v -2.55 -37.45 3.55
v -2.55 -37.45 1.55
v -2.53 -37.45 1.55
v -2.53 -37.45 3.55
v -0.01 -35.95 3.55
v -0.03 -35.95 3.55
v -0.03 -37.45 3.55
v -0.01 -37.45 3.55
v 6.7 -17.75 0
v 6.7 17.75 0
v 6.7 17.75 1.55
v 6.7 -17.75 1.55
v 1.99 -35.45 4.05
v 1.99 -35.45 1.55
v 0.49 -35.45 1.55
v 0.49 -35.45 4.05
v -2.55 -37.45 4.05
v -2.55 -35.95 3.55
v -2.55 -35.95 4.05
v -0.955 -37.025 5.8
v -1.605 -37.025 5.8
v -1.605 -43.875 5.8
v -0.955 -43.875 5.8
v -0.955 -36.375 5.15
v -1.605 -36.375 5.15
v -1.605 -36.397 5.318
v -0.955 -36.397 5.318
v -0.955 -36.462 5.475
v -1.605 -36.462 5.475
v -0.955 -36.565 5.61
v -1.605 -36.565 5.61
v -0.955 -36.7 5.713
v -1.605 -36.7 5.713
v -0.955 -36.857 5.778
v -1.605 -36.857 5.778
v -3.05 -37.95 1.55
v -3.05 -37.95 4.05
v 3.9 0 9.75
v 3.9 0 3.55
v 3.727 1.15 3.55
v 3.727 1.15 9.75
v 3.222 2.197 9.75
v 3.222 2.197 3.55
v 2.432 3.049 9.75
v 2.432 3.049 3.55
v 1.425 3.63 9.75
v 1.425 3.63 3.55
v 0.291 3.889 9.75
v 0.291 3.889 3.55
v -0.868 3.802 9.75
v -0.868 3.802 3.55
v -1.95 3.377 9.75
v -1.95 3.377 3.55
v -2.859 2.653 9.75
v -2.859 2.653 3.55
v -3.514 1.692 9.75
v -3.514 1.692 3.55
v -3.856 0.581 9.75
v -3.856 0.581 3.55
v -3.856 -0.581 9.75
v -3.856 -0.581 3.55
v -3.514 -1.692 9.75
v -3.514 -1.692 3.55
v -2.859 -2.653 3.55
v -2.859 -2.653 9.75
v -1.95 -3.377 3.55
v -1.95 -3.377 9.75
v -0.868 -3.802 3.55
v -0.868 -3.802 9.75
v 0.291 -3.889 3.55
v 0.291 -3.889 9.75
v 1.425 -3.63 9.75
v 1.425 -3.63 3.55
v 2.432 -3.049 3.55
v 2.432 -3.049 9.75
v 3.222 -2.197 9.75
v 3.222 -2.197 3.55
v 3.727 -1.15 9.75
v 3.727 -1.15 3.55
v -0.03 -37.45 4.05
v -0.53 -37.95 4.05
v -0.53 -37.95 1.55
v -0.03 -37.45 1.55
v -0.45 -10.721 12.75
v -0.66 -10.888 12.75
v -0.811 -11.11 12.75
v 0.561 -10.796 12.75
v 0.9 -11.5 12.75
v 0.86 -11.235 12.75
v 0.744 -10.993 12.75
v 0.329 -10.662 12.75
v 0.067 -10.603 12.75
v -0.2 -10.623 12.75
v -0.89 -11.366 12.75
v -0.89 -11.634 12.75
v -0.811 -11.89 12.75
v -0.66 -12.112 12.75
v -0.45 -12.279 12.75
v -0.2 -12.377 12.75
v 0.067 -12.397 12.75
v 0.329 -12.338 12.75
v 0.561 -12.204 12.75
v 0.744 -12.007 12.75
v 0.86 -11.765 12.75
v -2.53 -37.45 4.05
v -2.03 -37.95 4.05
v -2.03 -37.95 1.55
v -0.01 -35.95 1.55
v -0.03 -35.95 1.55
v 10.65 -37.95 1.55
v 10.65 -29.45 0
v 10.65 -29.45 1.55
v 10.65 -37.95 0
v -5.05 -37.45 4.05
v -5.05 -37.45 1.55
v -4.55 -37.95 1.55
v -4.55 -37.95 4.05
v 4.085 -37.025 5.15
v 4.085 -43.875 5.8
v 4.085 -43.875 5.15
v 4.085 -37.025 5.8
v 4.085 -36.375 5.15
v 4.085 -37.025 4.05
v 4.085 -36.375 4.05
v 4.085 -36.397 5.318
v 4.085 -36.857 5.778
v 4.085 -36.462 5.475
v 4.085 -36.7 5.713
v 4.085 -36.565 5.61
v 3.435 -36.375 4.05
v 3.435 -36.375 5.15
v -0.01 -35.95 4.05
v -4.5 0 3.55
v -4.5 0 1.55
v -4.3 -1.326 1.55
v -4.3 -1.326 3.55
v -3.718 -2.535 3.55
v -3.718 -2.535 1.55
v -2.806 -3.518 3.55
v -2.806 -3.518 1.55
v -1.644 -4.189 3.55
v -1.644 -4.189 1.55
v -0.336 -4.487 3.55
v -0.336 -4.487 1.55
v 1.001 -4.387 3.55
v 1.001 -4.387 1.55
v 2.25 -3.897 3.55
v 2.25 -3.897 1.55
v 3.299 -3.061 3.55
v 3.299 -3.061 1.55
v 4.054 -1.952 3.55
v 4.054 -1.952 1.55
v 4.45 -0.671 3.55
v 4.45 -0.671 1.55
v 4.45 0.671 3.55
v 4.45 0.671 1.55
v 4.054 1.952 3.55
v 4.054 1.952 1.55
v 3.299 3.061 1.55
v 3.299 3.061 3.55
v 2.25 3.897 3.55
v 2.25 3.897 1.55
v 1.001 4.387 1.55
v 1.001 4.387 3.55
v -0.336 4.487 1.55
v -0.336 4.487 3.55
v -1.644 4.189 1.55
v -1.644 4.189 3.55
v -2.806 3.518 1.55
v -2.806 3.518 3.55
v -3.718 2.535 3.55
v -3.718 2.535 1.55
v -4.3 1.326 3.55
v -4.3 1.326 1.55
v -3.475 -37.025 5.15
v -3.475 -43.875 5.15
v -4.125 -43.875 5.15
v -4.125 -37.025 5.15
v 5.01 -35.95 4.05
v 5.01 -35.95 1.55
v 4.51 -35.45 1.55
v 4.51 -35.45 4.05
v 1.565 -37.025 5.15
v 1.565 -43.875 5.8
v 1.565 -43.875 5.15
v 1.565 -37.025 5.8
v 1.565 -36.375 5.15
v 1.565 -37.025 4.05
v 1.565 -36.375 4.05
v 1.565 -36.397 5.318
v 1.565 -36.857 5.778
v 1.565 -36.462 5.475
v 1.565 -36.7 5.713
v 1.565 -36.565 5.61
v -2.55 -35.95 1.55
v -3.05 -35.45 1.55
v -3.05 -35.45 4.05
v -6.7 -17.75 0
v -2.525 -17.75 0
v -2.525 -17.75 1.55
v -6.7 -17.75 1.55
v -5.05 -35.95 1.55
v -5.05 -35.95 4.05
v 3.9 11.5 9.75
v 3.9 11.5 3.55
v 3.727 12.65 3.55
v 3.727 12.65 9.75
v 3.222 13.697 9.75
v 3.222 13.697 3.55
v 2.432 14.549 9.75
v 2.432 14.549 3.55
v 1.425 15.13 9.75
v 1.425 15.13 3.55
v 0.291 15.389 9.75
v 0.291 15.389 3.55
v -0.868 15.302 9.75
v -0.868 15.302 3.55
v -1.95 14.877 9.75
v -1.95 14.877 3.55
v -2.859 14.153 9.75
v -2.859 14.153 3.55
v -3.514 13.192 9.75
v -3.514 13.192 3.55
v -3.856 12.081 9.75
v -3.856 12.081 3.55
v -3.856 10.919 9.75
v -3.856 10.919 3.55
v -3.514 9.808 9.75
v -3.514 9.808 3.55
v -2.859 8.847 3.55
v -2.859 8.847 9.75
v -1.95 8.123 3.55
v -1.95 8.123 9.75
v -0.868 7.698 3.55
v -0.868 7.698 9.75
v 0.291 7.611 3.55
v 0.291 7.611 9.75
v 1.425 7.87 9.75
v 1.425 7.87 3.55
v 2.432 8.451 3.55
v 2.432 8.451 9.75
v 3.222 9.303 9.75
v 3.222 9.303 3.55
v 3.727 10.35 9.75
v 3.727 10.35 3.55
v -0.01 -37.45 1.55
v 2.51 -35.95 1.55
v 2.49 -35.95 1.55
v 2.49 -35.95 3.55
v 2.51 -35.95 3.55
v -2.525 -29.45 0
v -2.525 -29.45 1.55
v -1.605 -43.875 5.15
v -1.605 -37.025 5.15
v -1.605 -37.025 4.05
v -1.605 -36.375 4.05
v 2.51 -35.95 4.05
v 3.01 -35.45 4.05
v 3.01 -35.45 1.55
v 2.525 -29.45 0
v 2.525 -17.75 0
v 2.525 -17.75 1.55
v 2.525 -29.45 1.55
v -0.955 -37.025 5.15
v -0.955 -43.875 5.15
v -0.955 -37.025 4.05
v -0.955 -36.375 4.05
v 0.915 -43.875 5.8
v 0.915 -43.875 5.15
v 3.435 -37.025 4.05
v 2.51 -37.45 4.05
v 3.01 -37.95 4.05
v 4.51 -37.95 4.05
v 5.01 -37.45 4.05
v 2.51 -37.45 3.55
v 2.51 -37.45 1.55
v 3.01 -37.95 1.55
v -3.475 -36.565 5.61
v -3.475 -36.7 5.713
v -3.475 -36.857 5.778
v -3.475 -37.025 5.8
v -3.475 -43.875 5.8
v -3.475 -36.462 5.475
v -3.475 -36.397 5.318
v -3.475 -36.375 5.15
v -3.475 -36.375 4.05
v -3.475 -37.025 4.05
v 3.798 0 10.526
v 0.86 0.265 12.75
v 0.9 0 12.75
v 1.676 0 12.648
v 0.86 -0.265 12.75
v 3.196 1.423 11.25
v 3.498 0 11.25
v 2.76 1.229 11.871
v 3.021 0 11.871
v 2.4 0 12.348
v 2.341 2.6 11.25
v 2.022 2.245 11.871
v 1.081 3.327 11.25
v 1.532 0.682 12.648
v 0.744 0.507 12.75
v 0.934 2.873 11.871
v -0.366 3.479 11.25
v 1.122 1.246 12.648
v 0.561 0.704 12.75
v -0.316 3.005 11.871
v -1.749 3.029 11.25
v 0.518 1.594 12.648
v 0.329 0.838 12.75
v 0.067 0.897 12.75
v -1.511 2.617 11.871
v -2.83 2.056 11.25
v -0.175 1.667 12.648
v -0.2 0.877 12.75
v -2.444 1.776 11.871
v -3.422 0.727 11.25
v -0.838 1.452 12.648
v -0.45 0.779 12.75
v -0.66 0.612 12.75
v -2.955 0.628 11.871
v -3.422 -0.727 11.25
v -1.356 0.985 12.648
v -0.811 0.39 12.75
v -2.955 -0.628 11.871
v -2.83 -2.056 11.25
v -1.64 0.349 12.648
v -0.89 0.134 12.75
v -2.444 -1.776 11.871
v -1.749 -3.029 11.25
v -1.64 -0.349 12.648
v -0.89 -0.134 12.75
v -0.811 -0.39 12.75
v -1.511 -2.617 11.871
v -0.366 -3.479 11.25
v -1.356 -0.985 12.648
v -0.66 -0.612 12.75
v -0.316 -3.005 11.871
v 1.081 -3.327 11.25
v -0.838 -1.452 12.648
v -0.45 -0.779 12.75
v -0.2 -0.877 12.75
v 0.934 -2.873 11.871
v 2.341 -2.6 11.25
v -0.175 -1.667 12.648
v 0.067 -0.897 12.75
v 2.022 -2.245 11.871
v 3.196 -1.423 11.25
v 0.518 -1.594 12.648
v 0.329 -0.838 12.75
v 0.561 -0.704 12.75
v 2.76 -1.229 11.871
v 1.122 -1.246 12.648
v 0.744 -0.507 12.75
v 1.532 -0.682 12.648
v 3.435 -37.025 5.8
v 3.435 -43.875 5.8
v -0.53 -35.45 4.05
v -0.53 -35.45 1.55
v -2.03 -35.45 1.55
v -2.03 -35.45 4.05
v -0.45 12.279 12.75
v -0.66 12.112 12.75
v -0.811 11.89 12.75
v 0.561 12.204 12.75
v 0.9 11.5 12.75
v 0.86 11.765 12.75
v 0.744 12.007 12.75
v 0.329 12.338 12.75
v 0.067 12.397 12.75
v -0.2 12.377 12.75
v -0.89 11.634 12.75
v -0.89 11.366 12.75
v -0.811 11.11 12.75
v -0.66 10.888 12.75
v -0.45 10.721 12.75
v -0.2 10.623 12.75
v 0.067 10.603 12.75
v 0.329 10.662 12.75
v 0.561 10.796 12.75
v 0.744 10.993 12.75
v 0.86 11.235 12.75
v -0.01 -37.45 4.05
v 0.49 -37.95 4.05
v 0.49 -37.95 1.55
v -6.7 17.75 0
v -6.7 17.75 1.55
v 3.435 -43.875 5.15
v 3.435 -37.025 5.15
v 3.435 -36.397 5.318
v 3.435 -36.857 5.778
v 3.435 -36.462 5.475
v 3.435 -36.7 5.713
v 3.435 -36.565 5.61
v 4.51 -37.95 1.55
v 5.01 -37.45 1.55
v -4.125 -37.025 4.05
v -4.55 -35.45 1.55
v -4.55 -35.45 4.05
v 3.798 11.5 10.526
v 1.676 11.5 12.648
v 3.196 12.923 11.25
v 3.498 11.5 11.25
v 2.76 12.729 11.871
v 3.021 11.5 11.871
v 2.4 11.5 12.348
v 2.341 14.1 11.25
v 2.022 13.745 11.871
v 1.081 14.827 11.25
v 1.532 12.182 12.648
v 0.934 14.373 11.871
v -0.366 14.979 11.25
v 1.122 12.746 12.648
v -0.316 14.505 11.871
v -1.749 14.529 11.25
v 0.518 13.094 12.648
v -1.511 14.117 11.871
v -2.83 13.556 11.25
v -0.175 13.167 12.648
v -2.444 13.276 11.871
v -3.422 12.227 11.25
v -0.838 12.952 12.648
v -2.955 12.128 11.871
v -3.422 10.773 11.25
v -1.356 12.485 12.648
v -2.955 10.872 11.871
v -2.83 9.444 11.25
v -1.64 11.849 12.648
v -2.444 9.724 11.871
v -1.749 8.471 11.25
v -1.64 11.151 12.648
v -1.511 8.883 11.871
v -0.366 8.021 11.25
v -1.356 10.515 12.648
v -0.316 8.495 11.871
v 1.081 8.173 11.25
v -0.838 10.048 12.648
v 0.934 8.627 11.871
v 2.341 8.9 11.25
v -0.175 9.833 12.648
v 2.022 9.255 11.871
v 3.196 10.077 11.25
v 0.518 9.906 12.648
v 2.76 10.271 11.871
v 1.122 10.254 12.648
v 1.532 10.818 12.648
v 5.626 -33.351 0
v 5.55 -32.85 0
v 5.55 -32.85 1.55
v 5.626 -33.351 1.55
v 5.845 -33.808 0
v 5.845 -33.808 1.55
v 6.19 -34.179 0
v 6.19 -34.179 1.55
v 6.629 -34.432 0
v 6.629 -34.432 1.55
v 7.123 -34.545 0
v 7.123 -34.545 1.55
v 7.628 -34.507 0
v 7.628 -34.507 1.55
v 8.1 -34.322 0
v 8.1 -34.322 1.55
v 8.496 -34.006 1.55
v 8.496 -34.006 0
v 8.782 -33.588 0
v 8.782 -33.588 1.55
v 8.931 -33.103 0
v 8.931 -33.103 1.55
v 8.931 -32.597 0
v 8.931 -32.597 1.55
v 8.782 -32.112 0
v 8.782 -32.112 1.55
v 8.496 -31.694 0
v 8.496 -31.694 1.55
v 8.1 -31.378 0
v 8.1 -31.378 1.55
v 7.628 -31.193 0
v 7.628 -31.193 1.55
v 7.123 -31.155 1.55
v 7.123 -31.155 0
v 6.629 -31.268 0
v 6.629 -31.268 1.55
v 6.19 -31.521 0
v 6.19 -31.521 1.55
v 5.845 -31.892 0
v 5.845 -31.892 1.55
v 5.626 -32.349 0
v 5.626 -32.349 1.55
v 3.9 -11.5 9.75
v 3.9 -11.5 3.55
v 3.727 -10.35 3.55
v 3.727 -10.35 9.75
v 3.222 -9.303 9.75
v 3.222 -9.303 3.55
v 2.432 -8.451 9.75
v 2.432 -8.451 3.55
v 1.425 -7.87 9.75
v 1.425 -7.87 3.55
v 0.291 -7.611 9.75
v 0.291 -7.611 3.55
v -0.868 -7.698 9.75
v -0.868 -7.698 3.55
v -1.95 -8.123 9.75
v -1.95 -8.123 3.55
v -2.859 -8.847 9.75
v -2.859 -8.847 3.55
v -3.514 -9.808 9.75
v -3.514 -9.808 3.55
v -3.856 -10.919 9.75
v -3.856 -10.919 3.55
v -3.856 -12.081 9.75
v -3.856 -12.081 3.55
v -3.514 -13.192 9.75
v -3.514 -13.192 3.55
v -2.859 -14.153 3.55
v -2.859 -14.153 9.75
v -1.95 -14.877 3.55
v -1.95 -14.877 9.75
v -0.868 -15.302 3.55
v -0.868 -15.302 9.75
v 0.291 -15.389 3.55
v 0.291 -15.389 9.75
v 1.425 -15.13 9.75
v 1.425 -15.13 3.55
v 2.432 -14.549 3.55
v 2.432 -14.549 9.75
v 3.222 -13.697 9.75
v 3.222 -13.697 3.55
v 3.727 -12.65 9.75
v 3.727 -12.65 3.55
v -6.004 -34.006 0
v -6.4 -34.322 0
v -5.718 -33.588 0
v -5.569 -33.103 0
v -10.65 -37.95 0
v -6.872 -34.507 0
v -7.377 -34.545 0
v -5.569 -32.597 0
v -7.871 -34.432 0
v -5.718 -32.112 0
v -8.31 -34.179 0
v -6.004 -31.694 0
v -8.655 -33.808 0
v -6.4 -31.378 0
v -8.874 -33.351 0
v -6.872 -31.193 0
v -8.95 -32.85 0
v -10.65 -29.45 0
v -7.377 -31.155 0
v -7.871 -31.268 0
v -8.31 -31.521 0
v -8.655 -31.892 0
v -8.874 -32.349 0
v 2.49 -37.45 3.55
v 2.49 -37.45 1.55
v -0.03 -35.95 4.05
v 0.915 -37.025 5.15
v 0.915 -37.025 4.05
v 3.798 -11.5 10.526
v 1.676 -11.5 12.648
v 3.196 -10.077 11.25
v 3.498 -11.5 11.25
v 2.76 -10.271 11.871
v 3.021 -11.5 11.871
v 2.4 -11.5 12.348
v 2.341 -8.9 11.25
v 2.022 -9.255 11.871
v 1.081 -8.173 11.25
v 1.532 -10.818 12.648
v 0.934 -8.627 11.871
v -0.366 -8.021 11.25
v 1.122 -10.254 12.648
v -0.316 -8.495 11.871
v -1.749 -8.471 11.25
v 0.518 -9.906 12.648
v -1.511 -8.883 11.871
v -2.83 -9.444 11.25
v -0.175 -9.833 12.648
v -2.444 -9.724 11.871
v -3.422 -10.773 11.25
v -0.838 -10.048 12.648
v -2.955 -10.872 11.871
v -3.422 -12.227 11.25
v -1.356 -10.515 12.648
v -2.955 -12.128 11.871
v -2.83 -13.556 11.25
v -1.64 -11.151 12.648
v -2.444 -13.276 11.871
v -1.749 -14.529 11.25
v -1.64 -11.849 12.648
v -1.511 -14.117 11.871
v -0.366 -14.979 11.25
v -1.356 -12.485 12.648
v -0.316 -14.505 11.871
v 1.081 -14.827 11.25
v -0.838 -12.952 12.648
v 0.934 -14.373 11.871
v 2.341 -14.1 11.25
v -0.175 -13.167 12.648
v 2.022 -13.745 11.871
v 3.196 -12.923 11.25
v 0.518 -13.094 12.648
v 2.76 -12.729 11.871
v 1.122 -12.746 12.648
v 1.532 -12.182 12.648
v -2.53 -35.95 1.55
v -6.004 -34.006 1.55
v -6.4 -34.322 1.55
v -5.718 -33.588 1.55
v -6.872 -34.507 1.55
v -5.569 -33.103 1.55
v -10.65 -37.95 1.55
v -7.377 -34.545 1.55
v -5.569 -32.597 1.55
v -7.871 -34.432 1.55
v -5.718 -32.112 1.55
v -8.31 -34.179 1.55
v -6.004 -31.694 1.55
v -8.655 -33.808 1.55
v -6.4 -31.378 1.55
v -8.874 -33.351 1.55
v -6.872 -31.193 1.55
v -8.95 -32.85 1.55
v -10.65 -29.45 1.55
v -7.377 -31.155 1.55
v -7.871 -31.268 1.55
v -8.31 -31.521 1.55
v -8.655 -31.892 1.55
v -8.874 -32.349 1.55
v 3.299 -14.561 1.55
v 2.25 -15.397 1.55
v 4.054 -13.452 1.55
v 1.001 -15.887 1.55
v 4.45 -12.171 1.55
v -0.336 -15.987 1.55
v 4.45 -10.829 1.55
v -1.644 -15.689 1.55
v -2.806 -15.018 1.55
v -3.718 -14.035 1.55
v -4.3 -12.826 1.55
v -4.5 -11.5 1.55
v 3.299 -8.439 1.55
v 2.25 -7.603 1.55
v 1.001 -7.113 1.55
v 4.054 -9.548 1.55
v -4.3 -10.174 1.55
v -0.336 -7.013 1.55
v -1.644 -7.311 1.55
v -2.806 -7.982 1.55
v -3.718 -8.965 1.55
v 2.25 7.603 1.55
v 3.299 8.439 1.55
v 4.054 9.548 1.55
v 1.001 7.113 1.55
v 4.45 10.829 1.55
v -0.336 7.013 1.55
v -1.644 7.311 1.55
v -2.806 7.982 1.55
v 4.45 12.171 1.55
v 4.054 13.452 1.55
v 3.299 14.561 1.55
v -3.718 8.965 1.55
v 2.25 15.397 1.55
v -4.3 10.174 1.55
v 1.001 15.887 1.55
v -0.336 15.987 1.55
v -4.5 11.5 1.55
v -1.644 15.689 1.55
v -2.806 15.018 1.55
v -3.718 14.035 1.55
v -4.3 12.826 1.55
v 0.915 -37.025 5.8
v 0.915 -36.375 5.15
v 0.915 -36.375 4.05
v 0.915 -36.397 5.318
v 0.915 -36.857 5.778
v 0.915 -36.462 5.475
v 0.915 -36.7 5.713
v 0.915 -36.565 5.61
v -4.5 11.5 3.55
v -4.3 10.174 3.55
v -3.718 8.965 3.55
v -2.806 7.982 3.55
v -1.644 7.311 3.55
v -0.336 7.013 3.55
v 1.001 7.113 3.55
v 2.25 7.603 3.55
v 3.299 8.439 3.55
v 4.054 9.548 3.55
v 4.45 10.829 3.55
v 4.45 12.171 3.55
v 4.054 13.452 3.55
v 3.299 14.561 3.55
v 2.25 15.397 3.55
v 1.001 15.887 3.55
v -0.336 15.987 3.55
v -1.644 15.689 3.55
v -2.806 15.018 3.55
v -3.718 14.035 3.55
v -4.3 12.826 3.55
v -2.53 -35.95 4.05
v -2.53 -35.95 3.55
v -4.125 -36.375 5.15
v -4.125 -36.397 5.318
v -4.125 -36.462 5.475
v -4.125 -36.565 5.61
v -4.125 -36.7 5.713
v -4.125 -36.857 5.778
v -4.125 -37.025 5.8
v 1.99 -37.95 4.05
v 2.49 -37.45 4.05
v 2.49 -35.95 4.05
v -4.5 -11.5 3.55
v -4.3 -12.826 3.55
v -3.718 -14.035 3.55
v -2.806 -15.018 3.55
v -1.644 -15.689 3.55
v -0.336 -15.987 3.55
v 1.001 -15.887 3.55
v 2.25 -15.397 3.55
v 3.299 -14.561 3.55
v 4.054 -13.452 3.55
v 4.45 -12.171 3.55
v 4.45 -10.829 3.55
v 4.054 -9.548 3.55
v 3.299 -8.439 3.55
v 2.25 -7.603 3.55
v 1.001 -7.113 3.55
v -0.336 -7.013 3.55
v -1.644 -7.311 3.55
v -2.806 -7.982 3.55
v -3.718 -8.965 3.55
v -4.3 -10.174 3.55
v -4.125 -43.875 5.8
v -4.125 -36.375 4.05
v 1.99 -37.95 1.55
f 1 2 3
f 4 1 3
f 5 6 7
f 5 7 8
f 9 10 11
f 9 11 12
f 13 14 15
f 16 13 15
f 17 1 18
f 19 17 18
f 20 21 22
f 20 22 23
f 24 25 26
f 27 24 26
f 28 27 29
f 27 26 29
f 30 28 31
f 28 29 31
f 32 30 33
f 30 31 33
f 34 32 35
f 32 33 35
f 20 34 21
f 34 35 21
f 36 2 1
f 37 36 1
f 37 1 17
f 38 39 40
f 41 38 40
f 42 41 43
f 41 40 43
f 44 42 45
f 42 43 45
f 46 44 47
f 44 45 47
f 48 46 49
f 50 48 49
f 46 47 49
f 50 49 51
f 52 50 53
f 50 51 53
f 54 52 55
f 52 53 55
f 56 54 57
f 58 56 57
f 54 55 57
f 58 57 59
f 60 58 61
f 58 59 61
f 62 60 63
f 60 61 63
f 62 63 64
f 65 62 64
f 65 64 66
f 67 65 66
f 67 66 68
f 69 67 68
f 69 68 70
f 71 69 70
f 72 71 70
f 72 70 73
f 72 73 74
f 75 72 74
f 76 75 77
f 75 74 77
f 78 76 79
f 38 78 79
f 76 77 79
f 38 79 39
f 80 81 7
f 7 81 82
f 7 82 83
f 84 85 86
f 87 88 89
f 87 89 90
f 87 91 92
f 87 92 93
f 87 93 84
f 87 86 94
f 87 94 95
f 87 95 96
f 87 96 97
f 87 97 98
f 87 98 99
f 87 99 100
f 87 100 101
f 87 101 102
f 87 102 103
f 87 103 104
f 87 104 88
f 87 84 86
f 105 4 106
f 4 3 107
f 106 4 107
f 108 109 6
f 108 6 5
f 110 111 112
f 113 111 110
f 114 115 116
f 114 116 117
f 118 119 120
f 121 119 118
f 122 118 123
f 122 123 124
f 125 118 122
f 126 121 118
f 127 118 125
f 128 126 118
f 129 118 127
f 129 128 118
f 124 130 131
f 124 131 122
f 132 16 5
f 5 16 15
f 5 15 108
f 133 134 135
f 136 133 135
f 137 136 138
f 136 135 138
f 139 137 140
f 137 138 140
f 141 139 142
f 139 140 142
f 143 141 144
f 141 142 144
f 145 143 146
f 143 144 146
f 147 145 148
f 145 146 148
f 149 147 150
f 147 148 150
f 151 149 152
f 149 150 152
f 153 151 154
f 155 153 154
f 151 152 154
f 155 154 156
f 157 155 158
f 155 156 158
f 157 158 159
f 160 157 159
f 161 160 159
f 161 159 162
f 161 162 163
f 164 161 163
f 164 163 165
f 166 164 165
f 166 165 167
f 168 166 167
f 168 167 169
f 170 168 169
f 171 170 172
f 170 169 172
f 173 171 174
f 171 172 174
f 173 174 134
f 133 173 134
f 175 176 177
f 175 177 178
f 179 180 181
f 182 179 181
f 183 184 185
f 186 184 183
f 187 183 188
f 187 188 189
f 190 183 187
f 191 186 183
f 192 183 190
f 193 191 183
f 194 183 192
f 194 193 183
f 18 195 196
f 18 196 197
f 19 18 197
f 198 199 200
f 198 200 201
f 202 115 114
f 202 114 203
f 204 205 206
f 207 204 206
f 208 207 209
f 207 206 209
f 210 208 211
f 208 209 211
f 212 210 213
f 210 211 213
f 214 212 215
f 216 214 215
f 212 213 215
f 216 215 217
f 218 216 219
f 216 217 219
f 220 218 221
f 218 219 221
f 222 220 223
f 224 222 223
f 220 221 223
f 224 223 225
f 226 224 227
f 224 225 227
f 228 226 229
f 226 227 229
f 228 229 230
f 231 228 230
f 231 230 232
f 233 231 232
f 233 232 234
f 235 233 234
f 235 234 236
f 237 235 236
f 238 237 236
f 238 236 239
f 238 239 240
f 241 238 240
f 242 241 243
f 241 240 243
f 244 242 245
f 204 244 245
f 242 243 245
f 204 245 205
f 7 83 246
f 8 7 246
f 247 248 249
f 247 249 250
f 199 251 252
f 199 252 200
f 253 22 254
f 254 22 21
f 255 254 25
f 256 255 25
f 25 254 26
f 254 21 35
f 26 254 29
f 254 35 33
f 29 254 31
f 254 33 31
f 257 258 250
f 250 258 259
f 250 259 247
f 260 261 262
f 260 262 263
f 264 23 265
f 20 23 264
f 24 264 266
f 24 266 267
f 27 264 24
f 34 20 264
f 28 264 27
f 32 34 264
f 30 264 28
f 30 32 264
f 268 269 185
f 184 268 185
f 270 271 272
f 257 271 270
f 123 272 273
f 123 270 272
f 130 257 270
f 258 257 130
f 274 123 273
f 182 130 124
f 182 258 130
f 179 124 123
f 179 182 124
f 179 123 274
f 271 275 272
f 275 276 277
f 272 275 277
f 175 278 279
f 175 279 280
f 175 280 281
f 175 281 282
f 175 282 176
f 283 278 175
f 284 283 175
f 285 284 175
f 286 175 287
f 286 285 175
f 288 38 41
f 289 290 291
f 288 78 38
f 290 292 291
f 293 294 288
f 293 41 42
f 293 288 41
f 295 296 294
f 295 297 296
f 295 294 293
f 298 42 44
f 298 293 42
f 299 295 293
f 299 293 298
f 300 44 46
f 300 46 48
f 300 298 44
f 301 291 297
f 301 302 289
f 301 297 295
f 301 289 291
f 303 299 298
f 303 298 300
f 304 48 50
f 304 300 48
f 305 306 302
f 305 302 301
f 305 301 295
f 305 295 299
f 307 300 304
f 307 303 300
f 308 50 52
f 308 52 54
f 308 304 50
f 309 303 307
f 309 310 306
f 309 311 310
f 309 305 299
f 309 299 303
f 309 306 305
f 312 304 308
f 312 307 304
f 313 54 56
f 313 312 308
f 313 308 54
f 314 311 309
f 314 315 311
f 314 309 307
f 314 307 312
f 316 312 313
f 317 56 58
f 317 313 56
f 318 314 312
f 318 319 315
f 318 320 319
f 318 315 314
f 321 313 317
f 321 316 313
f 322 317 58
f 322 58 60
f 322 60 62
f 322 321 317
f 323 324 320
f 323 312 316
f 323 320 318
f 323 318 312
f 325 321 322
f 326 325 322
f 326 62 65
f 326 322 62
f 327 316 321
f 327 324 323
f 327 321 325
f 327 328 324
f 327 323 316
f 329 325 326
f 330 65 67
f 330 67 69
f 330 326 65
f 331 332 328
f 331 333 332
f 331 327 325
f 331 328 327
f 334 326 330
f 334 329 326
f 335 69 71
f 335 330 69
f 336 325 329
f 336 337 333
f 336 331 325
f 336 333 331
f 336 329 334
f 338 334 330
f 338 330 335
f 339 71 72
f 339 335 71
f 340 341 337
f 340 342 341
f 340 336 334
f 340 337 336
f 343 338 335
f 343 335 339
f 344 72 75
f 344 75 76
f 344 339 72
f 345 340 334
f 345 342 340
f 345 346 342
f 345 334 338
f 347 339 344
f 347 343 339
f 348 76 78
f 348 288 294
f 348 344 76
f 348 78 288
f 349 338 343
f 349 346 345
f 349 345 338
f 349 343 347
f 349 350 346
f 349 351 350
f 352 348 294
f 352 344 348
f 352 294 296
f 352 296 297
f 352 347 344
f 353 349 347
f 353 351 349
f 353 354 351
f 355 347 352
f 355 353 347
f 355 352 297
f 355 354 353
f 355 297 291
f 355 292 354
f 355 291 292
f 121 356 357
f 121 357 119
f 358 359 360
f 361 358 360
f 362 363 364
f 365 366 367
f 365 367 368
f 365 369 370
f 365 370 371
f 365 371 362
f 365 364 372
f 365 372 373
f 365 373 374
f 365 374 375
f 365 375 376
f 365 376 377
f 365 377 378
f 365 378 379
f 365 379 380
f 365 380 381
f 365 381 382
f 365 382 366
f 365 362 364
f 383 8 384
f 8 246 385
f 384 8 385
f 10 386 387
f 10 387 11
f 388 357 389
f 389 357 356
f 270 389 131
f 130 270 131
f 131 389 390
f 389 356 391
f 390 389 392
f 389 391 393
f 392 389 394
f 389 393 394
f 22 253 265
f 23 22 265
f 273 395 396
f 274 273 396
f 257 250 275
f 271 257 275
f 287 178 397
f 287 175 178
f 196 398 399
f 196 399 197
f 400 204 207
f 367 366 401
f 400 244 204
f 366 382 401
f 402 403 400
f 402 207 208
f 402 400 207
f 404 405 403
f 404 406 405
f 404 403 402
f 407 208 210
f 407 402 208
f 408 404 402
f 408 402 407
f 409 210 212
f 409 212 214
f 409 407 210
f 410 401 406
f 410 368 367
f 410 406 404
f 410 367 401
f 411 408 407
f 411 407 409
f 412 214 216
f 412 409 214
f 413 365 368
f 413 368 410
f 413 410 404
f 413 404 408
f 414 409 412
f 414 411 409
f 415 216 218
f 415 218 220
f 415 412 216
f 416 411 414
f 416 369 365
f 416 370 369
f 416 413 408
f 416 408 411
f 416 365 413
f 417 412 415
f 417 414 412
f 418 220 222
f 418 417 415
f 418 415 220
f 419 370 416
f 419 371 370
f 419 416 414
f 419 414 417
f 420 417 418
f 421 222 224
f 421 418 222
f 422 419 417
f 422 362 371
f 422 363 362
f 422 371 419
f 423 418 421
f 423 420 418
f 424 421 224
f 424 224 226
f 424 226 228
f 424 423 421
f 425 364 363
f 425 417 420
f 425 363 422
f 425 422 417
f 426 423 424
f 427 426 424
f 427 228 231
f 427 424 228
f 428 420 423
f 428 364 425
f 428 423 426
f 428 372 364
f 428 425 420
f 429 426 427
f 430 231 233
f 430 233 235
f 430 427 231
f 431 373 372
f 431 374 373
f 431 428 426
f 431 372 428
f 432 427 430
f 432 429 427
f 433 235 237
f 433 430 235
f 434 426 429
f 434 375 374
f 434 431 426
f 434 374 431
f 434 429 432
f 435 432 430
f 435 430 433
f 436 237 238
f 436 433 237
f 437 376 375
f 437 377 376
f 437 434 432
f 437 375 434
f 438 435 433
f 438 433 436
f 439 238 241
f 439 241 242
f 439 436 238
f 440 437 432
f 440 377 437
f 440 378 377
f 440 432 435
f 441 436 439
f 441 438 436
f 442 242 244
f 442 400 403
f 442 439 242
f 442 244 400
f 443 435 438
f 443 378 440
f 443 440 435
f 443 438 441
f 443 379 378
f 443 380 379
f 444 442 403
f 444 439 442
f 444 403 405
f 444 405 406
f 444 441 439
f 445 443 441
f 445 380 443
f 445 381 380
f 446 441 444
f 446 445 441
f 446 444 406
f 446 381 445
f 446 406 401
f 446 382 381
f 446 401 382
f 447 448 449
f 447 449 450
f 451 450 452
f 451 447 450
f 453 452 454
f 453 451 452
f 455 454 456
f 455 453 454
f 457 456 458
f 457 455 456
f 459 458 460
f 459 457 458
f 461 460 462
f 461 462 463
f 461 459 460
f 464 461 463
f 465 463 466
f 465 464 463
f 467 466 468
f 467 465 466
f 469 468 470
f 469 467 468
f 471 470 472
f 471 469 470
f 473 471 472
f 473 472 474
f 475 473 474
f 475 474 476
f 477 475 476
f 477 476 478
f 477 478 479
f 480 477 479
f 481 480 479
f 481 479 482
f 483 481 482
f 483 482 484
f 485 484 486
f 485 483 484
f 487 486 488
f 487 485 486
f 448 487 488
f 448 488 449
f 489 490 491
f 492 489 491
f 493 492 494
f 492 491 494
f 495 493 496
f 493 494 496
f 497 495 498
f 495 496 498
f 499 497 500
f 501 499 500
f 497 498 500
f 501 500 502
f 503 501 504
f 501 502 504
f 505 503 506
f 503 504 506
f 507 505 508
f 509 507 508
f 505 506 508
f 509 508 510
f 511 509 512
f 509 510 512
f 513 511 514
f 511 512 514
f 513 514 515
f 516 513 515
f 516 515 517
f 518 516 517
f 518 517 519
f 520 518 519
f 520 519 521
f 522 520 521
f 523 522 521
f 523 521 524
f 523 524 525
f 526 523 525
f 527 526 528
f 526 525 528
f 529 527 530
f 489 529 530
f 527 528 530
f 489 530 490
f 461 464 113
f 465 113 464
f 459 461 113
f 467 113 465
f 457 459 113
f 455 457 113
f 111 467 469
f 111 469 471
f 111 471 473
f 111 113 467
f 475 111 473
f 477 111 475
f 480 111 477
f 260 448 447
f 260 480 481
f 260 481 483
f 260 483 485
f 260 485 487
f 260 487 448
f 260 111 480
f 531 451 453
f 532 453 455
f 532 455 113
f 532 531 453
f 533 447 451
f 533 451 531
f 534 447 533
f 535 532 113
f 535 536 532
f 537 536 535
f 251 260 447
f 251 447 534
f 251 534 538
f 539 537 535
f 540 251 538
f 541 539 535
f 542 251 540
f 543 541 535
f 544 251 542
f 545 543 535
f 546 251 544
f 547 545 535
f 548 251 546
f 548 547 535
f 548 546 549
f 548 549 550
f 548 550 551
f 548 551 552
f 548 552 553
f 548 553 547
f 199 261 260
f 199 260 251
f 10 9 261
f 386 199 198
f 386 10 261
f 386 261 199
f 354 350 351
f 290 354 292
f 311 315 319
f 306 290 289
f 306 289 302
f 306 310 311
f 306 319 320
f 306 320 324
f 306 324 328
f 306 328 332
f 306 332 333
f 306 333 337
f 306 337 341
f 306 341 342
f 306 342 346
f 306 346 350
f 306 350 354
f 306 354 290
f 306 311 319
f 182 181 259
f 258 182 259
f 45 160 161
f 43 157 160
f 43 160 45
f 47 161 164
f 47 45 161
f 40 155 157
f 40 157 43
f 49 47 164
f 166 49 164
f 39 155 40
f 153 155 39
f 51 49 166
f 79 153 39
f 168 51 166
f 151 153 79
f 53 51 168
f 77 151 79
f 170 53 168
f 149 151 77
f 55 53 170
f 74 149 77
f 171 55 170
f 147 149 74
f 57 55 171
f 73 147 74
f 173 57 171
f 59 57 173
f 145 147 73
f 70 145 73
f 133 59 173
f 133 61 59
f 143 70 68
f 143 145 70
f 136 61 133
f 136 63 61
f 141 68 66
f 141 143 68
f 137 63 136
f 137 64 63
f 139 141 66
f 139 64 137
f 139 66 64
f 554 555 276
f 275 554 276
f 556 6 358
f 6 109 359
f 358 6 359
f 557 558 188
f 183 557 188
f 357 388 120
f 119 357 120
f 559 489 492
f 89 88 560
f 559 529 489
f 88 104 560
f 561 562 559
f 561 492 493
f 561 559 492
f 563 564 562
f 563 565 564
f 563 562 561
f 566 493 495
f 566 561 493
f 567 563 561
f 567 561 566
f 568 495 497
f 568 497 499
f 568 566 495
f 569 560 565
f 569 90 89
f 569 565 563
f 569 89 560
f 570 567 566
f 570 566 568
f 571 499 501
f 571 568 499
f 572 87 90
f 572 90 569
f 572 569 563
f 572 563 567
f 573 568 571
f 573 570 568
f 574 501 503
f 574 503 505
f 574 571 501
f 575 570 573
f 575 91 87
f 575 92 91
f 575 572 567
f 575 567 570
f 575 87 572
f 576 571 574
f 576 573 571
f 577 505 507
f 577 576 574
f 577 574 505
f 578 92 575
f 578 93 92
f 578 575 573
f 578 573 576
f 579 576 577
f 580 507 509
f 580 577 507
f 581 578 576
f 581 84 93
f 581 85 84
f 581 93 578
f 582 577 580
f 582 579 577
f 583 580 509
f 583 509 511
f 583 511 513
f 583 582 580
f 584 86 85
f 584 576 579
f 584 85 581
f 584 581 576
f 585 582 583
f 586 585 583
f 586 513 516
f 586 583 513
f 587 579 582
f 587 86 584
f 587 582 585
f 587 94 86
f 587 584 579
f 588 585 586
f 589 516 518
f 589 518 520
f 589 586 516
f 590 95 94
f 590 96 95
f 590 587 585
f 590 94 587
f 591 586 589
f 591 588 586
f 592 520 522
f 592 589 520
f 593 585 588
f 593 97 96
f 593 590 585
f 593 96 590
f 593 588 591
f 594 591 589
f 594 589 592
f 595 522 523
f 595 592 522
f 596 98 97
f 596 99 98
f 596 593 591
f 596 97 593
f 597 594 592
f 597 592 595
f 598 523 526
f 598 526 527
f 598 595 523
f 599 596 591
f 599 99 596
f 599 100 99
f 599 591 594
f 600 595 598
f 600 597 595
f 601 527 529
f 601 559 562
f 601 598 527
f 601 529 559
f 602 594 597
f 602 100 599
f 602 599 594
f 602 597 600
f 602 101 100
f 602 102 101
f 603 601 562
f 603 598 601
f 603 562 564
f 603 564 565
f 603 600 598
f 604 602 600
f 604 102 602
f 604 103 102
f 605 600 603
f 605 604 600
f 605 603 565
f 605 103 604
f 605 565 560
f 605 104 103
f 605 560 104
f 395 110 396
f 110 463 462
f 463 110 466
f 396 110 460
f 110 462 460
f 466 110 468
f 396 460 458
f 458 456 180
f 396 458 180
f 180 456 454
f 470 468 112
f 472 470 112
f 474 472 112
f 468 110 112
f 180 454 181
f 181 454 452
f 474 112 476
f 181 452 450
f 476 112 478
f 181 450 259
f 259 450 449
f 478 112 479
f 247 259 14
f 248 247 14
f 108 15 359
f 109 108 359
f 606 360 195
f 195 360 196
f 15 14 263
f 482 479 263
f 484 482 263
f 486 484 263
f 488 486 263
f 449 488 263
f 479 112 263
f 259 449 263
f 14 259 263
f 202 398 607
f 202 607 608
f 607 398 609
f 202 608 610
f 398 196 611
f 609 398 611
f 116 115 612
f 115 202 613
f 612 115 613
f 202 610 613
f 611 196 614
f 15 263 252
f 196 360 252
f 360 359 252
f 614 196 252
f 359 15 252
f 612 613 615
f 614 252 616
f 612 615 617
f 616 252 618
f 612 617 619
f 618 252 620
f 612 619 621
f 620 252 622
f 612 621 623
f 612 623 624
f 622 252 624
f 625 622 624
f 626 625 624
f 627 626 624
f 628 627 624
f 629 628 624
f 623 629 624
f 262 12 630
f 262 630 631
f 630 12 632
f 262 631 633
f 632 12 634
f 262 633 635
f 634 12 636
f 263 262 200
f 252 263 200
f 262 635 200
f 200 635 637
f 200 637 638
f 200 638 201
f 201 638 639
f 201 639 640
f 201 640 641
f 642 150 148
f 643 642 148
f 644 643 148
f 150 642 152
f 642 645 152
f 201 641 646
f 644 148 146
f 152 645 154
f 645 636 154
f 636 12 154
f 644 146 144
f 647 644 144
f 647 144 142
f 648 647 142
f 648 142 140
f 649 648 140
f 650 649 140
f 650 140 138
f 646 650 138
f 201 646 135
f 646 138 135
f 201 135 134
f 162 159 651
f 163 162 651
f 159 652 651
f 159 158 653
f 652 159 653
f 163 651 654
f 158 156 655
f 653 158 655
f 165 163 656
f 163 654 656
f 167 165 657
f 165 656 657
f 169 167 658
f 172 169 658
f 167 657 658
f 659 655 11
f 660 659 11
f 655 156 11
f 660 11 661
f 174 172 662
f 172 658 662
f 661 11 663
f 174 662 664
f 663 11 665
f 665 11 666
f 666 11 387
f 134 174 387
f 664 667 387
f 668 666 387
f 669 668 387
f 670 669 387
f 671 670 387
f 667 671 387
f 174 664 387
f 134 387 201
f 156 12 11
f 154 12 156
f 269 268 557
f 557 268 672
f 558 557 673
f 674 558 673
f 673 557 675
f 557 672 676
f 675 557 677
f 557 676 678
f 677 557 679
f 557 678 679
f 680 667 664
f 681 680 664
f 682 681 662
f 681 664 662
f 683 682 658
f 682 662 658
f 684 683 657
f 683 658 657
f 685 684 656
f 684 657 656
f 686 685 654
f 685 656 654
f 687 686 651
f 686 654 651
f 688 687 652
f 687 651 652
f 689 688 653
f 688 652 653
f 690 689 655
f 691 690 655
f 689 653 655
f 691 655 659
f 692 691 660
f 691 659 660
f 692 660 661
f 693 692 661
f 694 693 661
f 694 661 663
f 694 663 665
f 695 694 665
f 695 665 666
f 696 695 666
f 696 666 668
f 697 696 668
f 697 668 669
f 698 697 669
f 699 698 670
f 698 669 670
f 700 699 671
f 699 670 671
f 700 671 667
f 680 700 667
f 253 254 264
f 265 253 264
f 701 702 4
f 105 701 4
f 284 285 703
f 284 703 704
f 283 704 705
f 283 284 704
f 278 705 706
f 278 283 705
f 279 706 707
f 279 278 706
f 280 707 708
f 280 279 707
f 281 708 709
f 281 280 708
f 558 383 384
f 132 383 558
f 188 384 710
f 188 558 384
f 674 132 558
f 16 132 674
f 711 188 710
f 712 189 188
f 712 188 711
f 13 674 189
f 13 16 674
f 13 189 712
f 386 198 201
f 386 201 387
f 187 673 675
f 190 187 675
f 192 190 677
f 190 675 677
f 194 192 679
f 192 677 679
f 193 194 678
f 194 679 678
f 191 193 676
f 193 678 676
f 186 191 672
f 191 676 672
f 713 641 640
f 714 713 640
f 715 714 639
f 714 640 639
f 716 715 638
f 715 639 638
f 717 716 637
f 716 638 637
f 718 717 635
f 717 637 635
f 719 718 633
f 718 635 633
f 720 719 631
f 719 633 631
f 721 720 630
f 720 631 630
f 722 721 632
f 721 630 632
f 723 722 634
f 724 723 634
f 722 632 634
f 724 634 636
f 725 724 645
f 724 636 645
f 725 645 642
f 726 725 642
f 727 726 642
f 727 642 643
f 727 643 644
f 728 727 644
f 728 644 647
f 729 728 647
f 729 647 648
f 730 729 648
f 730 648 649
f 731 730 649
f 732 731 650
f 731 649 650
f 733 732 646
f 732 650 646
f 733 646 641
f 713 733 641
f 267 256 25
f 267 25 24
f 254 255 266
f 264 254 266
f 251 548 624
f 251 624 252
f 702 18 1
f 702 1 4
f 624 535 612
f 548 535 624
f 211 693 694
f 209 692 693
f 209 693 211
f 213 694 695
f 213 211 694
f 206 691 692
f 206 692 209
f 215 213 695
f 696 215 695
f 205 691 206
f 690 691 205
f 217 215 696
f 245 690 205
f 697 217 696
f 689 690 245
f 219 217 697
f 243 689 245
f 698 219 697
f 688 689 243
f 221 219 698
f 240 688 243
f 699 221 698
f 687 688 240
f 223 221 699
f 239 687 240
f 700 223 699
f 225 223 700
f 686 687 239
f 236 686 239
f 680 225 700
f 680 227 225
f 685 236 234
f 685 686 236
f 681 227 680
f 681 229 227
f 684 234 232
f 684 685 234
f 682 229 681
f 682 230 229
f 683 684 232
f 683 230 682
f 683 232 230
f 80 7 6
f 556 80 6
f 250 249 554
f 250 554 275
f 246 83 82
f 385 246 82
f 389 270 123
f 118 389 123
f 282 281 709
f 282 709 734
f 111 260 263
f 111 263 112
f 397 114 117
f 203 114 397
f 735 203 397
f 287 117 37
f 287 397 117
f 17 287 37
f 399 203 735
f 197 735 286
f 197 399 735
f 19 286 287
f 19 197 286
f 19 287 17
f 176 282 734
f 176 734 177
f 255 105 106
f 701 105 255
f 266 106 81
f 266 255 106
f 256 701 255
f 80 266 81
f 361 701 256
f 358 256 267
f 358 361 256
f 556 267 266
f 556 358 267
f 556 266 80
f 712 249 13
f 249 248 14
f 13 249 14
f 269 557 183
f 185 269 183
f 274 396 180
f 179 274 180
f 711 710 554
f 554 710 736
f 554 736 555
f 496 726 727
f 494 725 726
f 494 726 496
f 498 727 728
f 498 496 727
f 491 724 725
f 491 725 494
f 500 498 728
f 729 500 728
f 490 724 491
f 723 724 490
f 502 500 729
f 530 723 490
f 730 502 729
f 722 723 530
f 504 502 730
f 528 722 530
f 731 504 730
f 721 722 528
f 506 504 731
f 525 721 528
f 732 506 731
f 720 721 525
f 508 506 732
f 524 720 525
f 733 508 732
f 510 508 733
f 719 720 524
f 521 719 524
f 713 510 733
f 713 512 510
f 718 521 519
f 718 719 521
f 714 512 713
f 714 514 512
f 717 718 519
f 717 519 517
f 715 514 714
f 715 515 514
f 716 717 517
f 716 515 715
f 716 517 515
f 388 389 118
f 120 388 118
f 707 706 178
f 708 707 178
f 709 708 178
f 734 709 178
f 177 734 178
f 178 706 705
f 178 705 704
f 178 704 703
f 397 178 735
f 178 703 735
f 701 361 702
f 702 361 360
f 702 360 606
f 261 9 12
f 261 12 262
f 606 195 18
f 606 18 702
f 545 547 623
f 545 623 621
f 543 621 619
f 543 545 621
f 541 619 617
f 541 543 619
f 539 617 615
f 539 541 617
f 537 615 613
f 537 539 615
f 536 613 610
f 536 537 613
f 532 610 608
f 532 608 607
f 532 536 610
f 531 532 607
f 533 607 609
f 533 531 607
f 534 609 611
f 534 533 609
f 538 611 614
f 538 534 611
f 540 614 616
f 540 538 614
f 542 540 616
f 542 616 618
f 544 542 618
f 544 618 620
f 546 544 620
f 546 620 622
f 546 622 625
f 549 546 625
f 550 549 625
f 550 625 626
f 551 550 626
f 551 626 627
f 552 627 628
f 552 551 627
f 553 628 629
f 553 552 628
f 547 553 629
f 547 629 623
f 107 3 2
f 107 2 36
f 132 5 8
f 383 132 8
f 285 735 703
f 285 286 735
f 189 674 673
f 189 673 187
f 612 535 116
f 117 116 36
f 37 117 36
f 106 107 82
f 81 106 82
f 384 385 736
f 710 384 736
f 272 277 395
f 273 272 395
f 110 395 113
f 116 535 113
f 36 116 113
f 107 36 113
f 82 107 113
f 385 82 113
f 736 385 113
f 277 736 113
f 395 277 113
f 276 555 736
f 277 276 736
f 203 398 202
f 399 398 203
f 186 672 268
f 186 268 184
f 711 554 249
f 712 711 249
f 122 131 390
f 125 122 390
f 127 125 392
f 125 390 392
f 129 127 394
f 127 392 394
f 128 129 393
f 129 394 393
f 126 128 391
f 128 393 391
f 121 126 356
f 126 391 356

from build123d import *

# Parameters (mm, degrees)
SKETCH1_R               = 1.7
BOSS_EXTRUDE1_DEPTH     = 1.55
SKETCH2_R               = 4.5
BOSS_EXTRUDE2_DEPTH     = 2
SKETCH3_R               = 3.9
BOSS_EXTRUDE3_DEPTH     = 9.2
FILLET1_R               = 3
SKETCH4_W               = 2.5
SKETCH4_H               = 2.5
BOSS_EXTRUDE5_DEPTH     = 2.5
CHAMFER1_SIZE           = 0.5
SKETCH5_W               = 0.25
SKETCH5_H               = 1.5
BOSS_EXTRUDE6_DEPTH     = 2
BOSS_EXTRUDE7_START     = -3.8
BOSS_EXTRUDE7_DEPTH     = 0.325
LPATTERN1_START         = 1.55
LPATTERN1_DEPTH         = 2.5
LPATTERN1_START_2       = 5.15
LPATTERN1_2_OUTLINE_W   = 0.65
LPATTERN1_2_OUTLINE_H   = 6.85
LPATTERN1_2_DEPTH       = 0.65
LPATTERN1_START_3       = 4.05
LPATTERN1_3_OUTLINE_W   = 0.65
LPATTERN1_3_OUTLINE_H   = 0.65
LPATTERN1_3_DEPTH       = 1.1
LPATTERN1_4_OUTLINE_W   = 0.02
LPATTERN1_4_OUTLINE_H   = 1.5
LPATTERN1_4_OUTLINE_W_2 = 0.25
LPATTERN1_4_DEPTH       = 2
LPATTERN1_START_4       = -1.605
LPATTERN1_5_DEPTH       = 0.65
LPATTERN1_START_5       = 0.915
LPATTERN1_6_DEPTH       = 0.65
LPATTERN1_START_6       = 3.435
LPATTERN1_7_DEPTH       = 0.65
DELETEFACE1_START       = 5.01
DELETEFACE1_OUTLINE_W   = 1.5
DELETEFACE1_OUTLINE_H   = 2
DELETEFACE1_DEPTH       = 0.25


with BuildPart() as part:
    # Sketch1 → Boss-Extrude1 (new body)
    with BuildSketch(Plane.XY):
        Polygon((-6.7, 17.75), (6.7, 17.75), (6.7, -17.75), (2.525, -17.75), (2.525, -29.45), (10.65, -29.45), (10.65, -37.95), (-10.65, -37.95), (-10.65, -29.45), (-2.525, -29.45), (-2.525, -17.75), (-6.7, -17.75), align=None)
        with Locations(Location((-7.25, -32.85, 0), (0, 0, 180))):
            Circle(SKETCH1_R, mode=Mode.SUBTRACT)
        with Locations(Location((7.25, -32.85, 0), (0, 0, 180))):
            Circle(SKETCH1_R, mode=Mode.SUBTRACT)
    extrude(amount=BOSS_EXTRUDE1_DEPTH)

    # Sketch2 → Boss-Extrude2 (add)
    with BuildSketch(Plane.XY.offset(1.55)):
        with Locations(Location((0, 11.5, 0), (0, 0, 180))):
            Circle(SKETCH2_R)
        with Locations(Location((0, 0, 0), (0, 0, 180))):
            Circle(SKETCH2_R)
        with Locations(Location((0, -11.5, 0), (0, 0, 180))):
            Circle(SKETCH2_R)
    extrude(amount=BOSS_EXTRUDE2_DEPTH)

    # Sketch3 → Boss-Extrude3 (add)
    with BuildSketch(Plane.XY.offset(3.55)):
        Circle(SKETCH3_R)
        with Locations((0, 11.5)):
            Circle(SKETCH3_R)
        with Locations((0, -11.5)):
            Circle(SKETCH3_R)
    extrude(amount=BOSS_EXTRUDE3_DEPTH)

    # Fillet1
    fillet1_edges = [part.edges().sort_by_distance(p)[0] for p in [
        (-3.9, 0, 12.75),
        (-3.9, 11.5, 12.75),
        (-3.9, -11.5, 12.75),
    ]]
    fillet(fillet1_edges, radius=FILLET1_R)

    # Sketch4 → Boss-Extrude5 (add)
    with BuildSketch(Plane.XY.offset(1.55)):
        with Locations((-3.8, -36.7)):
            Rectangle(SKETCH4_W, SKETCH4_H)
    extrude(amount=BOSS_EXTRUDE5_DEPTH)

    # Chamfer1
    chamfer1_edges = [part.edges().sort_by_distance(p)[0] for p in [
        (-2.55, -37.95, 2.8),
        (-2.55, -35.45, 2.8),
        (-5.05, -35.45, 2.8),
        (-5.05, -37.95, 2.8),
    ]]
    chamfer(chamfer1_edges, length=CHAMFER1_SIZE)

    # Sketch5 → Boss-Extrude6 (add)
    with BuildSketch(Plane.XY.offset(1.55)):
        with Locations((-2.425, -36.7)):
            Rectangle(SKETCH5_W, SKETCH5_H)
    extrude(amount=BOSS_EXTRUDE6_DEPTH)

    # Sketch6 → Boss-Extrude7 (add, symmetric)
    with BuildSketch(Plane(origin=(0, 0, 0), x_dir=(0, 0, -1), z_dir=(1, 0, 0)).offset(BOSS_EXTRUDE7_START)):
        with BuildLine():
            Line((-4.05, -36.375), (-5.15, -36.375))
            ThreePointArc((-5.15, -36.375), (-5.609619408, -36.565380592), (-5.8, -37.025))
            Line((-5.8, -37.025), (-5.8, -43.875))
            Line((-5.8, -43.875), (-5.15, -43.875))
            Line((-5.15, -43.875), (-5.15, -37.025))
            Line((-5.15, -37.025), (-4.05, -37.025))
            Line((-4.05, -37.025), (-4.05, -36.375))
        make_face()
    extrude(amount=BOSS_EXTRUDE7_DEPTH, both=True)

    # LPattern1: read off the stored shape, not the designer's step
    # LPattern1 outline → LPattern1 (add)
    with BuildSketch(Plane.XY.offset(LPATTERN1_START)):
        Polygon((-0.01, -35.95), (-0.01, -37.45), (0.49, -37.95), (1.99, -37.95), (2.49, -37.45), (2.49, -35.95), (1.99, -35.45), (0.49, -35.45), align=None)
        Polygon((-0.53, -37.95), (-0.03, -37.45), (-0.03, -35.95), (-0.53, -35.45), (-2.03, -35.45), (-2.53, -35.95), (-2.53, -37.45), (-2.03, -37.95), align=None)
        Polygon((3.01, -35.45), (2.51, -35.95), (2.51, -37.45), (3.01, -37.95), (4.51, -37.95), (5.01, -37.45), (5.01, -35.95), (4.51, -35.45), align=None)
    extrude(amount=LPATTERN1_DEPTH)



with BuildPart() as body_2:
    # LPattern1 2 outline → LPattern1 2 (new body)
    with BuildSketch(Plane.XY.offset(LPATTERN1_START_2)):
        with Locations((1.24, -40.45)):
            Rectangle(LPATTERN1_2_OUTLINE_W, LPATTERN1_2_OUTLINE_H)
        with Locations((-1.28, -40.45)):
            Rectangle(LPATTERN1_2_OUTLINE_W, LPATTERN1_2_OUTLINE_H)
        with Locations((3.76, -40.45)):
            Rectangle(LPATTERN1_2_OUTLINE_W, LPATTERN1_2_OUTLINE_H)
    extrude(amount=LPATTERN1_2_DEPTH)


with BuildPart() as part_1:
    add(part.part)

    add(body_2.part)  # LPattern1 3 merges body 2
    # LPattern1 3 outline → LPattern1 3 (add)
    with BuildSketch(Plane.XY.offset(LPATTERN1_START_3)):
        with Locations((1.24, -36.7)):
            Rectangle(LPATTERN1_3_OUTLINE_W, LPATTERN1_3_OUTLINE_H)
        with Locations((-1.28, -36.7)):
            Rectangle(LPATTERN1_3_OUTLINE_W, LPATTERN1_3_OUTLINE_H)
        with Locations((3.76, -36.7)):
            Rectangle(LPATTERN1_3_OUTLINE_W, LPATTERN1_3_OUTLINE_H)
    extrude(amount=LPATTERN1_3_DEPTH)

    # LPattern1 4 outline → LPattern1 4 (add)
    with BuildSketch(Plane.XY.offset(LPATTERN1_START)):
        with Locations((-0.02, -36.7)):
            Rectangle(LPATTERN1_4_OUTLINE_W, LPATTERN1_4_OUTLINE_H)
        with Locations((2.5, -36.7)):
            Rectangle(LPATTERN1_4_OUTLINE_W, LPATTERN1_4_OUTLINE_H)
        with Locations((5.135, -36.7)):
            Rectangle(LPATTERN1_4_OUTLINE_W_2, LPATTERN1_4_OUTLINE_H)
    extrude(amount=LPATTERN1_4_DEPTH)

    # LPattern1 5 outline → LPattern1 5 (add)
    with BuildSketch(Plane.YZ.offset(LPATTERN1_START_4)):
        with BuildLine():
            ThreePointArc((-36.375, 5.15), (-36.565380592, 5.609619408), (-37.025, 5.8))
            Line((-37.025, 5.8), (-37.025, 5.15))
            Line((-37.025, 5.15), (-36.375, 5.15))
        make_face()
    extrude(amount=LPATTERN1_5_DEPTH)

    # LPattern1 6 outline → LPattern1 6 (add)
    with BuildSketch(Plane.YZ.offset(LPATTERN1_START_5)):
        with BuildLine():
            ThreePointArc((-36.375, 5.15), (-36.565380592, 5.609619408), (-37.025, 5.8))
            Line((-37.025, 5.8), (-37.025, 5.15))
            Line((-37.025, 5.15), (-36.375, 5.15))
        make_face()
    extrude(amount=LPATTERN1_6_DEPTH)

    # LPattern1 7 outline → LPattern1 7 (add)
    with BuildSketch(Plane.YZ.offset(LPATTERN1_START_6)):
        with BuildLine():
            ThreePointArc((-36.375, 5.15), (-36.565380592, 5.609619408), (-37.025, 5.8))
            Line((-37.025, 5.8), (-37.025, 5.15))
            Line((-37.025, 5.15), (-36.375, 5.15))
        make_face()
    extrude(amount=LPATTERN1_7_DEPTH)

    # DeleteFace1: read off the stored shape, not the designer's step
    # DeleteFace1 outline → DeleteFace1 (cut)
    with BuildSketch(Plane.YZ.offset(DELETEFACE1_START)):
        with Locations((-36.7, 2.55)):
            Rectangle(DELETEFACE1_OUTLINE_W, DELETEFACE1_OUTLINE_H)
    extrude(amount=DELETEFACE1_DEPTH, mode=Mode.SUBTRACT)


solid = part_1.part
